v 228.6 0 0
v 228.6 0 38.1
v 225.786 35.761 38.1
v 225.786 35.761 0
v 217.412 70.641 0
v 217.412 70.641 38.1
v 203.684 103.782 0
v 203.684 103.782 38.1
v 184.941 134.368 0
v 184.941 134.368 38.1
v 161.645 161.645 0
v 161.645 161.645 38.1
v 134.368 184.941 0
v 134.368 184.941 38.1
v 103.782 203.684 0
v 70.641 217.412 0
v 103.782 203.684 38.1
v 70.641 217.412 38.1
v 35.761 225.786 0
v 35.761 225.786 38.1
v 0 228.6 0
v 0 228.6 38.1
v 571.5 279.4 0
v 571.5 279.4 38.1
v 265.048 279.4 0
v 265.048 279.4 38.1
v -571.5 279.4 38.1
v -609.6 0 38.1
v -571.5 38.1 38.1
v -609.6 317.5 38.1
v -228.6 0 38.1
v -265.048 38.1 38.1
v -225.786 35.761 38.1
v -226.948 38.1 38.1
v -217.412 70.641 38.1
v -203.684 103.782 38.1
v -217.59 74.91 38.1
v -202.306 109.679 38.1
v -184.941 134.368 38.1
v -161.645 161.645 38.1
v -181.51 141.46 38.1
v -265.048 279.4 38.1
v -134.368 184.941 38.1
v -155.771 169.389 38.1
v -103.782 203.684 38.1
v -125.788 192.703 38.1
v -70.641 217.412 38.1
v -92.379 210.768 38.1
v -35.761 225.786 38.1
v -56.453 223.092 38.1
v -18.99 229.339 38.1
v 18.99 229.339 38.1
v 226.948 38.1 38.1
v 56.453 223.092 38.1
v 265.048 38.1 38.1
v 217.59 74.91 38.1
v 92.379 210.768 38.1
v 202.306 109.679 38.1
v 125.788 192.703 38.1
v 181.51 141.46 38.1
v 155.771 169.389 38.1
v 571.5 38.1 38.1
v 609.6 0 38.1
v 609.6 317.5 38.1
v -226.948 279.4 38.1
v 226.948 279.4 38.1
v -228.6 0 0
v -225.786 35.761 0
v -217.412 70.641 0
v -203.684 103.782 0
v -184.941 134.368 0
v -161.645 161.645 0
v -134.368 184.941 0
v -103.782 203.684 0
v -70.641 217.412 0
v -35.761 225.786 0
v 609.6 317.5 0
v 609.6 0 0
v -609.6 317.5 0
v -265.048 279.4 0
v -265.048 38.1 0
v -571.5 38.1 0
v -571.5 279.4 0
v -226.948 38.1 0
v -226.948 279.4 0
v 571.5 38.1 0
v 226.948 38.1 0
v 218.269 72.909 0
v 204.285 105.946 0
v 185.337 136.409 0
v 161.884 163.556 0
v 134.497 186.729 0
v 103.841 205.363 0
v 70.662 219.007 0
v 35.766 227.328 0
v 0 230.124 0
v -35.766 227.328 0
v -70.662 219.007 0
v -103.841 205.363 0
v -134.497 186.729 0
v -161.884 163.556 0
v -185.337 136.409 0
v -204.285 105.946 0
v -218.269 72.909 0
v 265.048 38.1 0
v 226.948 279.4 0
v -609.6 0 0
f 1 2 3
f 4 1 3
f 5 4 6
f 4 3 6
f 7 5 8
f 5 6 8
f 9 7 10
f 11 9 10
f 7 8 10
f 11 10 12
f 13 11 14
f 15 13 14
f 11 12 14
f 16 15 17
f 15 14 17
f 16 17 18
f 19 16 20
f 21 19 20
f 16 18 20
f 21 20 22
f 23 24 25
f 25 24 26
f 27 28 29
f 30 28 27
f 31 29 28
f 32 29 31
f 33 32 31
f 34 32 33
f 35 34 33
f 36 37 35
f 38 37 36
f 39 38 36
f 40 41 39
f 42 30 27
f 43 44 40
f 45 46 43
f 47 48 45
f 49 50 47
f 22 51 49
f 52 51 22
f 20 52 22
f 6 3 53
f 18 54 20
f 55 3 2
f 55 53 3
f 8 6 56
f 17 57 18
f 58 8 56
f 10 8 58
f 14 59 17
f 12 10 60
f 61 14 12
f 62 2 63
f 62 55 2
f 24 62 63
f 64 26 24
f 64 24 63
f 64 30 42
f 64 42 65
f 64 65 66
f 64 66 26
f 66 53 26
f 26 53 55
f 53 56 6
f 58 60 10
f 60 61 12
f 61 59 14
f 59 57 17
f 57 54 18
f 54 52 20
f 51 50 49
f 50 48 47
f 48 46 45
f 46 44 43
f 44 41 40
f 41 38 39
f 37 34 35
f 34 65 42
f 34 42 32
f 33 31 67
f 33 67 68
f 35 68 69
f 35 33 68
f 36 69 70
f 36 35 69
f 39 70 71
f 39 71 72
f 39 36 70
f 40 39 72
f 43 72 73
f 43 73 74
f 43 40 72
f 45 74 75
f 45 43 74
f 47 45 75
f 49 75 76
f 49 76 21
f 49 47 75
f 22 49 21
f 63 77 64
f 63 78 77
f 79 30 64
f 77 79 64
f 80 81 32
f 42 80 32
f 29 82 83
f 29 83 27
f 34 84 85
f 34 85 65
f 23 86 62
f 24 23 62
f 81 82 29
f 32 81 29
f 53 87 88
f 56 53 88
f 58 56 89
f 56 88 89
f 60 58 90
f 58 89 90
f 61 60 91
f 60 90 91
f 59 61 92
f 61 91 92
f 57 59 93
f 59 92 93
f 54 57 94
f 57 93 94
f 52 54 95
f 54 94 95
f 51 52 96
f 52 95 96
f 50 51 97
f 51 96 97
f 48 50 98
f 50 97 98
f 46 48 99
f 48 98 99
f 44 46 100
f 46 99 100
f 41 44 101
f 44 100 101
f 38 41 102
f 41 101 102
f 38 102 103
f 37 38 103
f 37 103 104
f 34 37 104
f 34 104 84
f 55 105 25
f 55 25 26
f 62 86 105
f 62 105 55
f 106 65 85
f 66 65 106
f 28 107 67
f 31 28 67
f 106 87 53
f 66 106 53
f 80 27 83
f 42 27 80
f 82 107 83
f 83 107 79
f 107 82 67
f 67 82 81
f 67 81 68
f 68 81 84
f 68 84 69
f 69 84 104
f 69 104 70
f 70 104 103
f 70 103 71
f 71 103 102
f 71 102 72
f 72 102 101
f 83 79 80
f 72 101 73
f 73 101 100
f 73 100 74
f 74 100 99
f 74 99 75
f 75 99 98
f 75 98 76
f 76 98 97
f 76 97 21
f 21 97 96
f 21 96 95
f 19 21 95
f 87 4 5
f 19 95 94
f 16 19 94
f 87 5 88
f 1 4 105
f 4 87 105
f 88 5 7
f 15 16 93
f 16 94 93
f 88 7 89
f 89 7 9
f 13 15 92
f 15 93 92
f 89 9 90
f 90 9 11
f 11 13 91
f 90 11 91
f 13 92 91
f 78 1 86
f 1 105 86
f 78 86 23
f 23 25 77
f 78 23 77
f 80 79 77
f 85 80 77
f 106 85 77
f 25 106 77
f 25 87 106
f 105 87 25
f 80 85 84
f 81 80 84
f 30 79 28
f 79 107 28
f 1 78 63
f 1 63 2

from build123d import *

# Parameters (mm, degrees)
F0_R      = 228.6
F1_DEPTH  = 2286
F3_DEPTH  = 38.1
F6_W      = 38.1
F6_H      = 38.1
F8_W      = 38.1
F8_H      = 38.1
F9_DEPTH  = 279.4
F10_W     = 571.5
F10_H     = 38.1
F11_DEPTH = 38.1
F12_W     = 424.9351322651
F12_H     = 38.1
F13_DEPTH = 546.101
F14_R     = 228.6
F15_DEPTH = 4572


with BuildPart() as f1:
    # F0 (on Top) → F1 (new body, symmetric)
    with BuildSketch(Plane.XY):
        Circle(F0_R)
    extrude(amount=F1_DEPTH, both=True)

    # F2 (on Top) → F3 (join)
    with BuildSketch(Plane.XY):
        with BuildLine():
            ThreePointArc((-226.949, 0), (-160.4771768835, 160.4771768835), (0, 226.949))
            Line((0, 226.949), (0, 230.124))
            ThreePointArc((0, 230.124), (-162.7222409138, 162.7222409138), (-230.124, 0))
            Line((-230.124, 0), (-226.949, 0))
        make_face()
    extrude(amount=F3_DEPTH)

    # F4: F1 across face


with BuildPart() as f1_1:
    add(f1.part)
    add(f1.part.mirror(Plane(origin=(0, 229.362, 19.05), x_dir=(0, 1, 0), z_dir=(1, 0, 0))))

    # F6 (on offset) → F7 (join, up to the next surface of F1)
    with BuildSketch(Plane.YZ.offset(609.6)):
        with Locations((19.05, 19.05)):
            Rectangle(F6_W, F6_H)
    extrude(until=Until.NEXT, dir=(-1, 0, 0))

    # F8 (on face) → F9 (join)
    with BuildSketch(Plane(origin=(0, 38.1, 0), x_dir=(-1, 0, 0), z_dir=(0, 1, 0))):
        with Locations((-590.55, 19.05)):
            Rectangle(F8_W, F8_H)
        with Locations((-245.9981116379, 19.05)):
            Rectangle(F8_W, F8_H)
    extrude(amount=F9_DEPTH)

    # F10 (on face) → F11 (join)
    with BuildSketch(Plane(origin=(0, 317.5, 0), x_dir=(-1, 0, 0), z_dir=(0, 1, 0))):
        with Locations((-285.75, 19.05)):
            Rectangle(F10_W, F10_H)
    extrude(amount=-F11_DEPTH)

    # F12 (on face) → F13 (cut, through all)
    with BuildSketch(Plane(origin=(0, 317.5, 0), x_dir=(-1, 0, 0), z_dir=(0, 1, 0))):
        with Locations((212.4675661325, 19.05)):
            Rectangle(F12_W, F12_H)
    extrude(amount=-F13_DEPTH, mode=Mode.SUBTRACT)

    # F14 (on face) → F15 (cut)
    with BuildSketch(Plane.XY.offset(2286)):
        Circle(F14_R)
    extrude(amount=-F15_DEPTH, mode=Mode.SUBTRACT)

    # F16: F1 across face


with BuildPart() as f1_2:
    add(f1_1.part)
    add(f1_1.part.mirror(Plane(origin=(0, 298.45, 19.05), x_dir=(0, -1, 0), z_dir=(-1, 0, 0))))


solid = f1_2.part
